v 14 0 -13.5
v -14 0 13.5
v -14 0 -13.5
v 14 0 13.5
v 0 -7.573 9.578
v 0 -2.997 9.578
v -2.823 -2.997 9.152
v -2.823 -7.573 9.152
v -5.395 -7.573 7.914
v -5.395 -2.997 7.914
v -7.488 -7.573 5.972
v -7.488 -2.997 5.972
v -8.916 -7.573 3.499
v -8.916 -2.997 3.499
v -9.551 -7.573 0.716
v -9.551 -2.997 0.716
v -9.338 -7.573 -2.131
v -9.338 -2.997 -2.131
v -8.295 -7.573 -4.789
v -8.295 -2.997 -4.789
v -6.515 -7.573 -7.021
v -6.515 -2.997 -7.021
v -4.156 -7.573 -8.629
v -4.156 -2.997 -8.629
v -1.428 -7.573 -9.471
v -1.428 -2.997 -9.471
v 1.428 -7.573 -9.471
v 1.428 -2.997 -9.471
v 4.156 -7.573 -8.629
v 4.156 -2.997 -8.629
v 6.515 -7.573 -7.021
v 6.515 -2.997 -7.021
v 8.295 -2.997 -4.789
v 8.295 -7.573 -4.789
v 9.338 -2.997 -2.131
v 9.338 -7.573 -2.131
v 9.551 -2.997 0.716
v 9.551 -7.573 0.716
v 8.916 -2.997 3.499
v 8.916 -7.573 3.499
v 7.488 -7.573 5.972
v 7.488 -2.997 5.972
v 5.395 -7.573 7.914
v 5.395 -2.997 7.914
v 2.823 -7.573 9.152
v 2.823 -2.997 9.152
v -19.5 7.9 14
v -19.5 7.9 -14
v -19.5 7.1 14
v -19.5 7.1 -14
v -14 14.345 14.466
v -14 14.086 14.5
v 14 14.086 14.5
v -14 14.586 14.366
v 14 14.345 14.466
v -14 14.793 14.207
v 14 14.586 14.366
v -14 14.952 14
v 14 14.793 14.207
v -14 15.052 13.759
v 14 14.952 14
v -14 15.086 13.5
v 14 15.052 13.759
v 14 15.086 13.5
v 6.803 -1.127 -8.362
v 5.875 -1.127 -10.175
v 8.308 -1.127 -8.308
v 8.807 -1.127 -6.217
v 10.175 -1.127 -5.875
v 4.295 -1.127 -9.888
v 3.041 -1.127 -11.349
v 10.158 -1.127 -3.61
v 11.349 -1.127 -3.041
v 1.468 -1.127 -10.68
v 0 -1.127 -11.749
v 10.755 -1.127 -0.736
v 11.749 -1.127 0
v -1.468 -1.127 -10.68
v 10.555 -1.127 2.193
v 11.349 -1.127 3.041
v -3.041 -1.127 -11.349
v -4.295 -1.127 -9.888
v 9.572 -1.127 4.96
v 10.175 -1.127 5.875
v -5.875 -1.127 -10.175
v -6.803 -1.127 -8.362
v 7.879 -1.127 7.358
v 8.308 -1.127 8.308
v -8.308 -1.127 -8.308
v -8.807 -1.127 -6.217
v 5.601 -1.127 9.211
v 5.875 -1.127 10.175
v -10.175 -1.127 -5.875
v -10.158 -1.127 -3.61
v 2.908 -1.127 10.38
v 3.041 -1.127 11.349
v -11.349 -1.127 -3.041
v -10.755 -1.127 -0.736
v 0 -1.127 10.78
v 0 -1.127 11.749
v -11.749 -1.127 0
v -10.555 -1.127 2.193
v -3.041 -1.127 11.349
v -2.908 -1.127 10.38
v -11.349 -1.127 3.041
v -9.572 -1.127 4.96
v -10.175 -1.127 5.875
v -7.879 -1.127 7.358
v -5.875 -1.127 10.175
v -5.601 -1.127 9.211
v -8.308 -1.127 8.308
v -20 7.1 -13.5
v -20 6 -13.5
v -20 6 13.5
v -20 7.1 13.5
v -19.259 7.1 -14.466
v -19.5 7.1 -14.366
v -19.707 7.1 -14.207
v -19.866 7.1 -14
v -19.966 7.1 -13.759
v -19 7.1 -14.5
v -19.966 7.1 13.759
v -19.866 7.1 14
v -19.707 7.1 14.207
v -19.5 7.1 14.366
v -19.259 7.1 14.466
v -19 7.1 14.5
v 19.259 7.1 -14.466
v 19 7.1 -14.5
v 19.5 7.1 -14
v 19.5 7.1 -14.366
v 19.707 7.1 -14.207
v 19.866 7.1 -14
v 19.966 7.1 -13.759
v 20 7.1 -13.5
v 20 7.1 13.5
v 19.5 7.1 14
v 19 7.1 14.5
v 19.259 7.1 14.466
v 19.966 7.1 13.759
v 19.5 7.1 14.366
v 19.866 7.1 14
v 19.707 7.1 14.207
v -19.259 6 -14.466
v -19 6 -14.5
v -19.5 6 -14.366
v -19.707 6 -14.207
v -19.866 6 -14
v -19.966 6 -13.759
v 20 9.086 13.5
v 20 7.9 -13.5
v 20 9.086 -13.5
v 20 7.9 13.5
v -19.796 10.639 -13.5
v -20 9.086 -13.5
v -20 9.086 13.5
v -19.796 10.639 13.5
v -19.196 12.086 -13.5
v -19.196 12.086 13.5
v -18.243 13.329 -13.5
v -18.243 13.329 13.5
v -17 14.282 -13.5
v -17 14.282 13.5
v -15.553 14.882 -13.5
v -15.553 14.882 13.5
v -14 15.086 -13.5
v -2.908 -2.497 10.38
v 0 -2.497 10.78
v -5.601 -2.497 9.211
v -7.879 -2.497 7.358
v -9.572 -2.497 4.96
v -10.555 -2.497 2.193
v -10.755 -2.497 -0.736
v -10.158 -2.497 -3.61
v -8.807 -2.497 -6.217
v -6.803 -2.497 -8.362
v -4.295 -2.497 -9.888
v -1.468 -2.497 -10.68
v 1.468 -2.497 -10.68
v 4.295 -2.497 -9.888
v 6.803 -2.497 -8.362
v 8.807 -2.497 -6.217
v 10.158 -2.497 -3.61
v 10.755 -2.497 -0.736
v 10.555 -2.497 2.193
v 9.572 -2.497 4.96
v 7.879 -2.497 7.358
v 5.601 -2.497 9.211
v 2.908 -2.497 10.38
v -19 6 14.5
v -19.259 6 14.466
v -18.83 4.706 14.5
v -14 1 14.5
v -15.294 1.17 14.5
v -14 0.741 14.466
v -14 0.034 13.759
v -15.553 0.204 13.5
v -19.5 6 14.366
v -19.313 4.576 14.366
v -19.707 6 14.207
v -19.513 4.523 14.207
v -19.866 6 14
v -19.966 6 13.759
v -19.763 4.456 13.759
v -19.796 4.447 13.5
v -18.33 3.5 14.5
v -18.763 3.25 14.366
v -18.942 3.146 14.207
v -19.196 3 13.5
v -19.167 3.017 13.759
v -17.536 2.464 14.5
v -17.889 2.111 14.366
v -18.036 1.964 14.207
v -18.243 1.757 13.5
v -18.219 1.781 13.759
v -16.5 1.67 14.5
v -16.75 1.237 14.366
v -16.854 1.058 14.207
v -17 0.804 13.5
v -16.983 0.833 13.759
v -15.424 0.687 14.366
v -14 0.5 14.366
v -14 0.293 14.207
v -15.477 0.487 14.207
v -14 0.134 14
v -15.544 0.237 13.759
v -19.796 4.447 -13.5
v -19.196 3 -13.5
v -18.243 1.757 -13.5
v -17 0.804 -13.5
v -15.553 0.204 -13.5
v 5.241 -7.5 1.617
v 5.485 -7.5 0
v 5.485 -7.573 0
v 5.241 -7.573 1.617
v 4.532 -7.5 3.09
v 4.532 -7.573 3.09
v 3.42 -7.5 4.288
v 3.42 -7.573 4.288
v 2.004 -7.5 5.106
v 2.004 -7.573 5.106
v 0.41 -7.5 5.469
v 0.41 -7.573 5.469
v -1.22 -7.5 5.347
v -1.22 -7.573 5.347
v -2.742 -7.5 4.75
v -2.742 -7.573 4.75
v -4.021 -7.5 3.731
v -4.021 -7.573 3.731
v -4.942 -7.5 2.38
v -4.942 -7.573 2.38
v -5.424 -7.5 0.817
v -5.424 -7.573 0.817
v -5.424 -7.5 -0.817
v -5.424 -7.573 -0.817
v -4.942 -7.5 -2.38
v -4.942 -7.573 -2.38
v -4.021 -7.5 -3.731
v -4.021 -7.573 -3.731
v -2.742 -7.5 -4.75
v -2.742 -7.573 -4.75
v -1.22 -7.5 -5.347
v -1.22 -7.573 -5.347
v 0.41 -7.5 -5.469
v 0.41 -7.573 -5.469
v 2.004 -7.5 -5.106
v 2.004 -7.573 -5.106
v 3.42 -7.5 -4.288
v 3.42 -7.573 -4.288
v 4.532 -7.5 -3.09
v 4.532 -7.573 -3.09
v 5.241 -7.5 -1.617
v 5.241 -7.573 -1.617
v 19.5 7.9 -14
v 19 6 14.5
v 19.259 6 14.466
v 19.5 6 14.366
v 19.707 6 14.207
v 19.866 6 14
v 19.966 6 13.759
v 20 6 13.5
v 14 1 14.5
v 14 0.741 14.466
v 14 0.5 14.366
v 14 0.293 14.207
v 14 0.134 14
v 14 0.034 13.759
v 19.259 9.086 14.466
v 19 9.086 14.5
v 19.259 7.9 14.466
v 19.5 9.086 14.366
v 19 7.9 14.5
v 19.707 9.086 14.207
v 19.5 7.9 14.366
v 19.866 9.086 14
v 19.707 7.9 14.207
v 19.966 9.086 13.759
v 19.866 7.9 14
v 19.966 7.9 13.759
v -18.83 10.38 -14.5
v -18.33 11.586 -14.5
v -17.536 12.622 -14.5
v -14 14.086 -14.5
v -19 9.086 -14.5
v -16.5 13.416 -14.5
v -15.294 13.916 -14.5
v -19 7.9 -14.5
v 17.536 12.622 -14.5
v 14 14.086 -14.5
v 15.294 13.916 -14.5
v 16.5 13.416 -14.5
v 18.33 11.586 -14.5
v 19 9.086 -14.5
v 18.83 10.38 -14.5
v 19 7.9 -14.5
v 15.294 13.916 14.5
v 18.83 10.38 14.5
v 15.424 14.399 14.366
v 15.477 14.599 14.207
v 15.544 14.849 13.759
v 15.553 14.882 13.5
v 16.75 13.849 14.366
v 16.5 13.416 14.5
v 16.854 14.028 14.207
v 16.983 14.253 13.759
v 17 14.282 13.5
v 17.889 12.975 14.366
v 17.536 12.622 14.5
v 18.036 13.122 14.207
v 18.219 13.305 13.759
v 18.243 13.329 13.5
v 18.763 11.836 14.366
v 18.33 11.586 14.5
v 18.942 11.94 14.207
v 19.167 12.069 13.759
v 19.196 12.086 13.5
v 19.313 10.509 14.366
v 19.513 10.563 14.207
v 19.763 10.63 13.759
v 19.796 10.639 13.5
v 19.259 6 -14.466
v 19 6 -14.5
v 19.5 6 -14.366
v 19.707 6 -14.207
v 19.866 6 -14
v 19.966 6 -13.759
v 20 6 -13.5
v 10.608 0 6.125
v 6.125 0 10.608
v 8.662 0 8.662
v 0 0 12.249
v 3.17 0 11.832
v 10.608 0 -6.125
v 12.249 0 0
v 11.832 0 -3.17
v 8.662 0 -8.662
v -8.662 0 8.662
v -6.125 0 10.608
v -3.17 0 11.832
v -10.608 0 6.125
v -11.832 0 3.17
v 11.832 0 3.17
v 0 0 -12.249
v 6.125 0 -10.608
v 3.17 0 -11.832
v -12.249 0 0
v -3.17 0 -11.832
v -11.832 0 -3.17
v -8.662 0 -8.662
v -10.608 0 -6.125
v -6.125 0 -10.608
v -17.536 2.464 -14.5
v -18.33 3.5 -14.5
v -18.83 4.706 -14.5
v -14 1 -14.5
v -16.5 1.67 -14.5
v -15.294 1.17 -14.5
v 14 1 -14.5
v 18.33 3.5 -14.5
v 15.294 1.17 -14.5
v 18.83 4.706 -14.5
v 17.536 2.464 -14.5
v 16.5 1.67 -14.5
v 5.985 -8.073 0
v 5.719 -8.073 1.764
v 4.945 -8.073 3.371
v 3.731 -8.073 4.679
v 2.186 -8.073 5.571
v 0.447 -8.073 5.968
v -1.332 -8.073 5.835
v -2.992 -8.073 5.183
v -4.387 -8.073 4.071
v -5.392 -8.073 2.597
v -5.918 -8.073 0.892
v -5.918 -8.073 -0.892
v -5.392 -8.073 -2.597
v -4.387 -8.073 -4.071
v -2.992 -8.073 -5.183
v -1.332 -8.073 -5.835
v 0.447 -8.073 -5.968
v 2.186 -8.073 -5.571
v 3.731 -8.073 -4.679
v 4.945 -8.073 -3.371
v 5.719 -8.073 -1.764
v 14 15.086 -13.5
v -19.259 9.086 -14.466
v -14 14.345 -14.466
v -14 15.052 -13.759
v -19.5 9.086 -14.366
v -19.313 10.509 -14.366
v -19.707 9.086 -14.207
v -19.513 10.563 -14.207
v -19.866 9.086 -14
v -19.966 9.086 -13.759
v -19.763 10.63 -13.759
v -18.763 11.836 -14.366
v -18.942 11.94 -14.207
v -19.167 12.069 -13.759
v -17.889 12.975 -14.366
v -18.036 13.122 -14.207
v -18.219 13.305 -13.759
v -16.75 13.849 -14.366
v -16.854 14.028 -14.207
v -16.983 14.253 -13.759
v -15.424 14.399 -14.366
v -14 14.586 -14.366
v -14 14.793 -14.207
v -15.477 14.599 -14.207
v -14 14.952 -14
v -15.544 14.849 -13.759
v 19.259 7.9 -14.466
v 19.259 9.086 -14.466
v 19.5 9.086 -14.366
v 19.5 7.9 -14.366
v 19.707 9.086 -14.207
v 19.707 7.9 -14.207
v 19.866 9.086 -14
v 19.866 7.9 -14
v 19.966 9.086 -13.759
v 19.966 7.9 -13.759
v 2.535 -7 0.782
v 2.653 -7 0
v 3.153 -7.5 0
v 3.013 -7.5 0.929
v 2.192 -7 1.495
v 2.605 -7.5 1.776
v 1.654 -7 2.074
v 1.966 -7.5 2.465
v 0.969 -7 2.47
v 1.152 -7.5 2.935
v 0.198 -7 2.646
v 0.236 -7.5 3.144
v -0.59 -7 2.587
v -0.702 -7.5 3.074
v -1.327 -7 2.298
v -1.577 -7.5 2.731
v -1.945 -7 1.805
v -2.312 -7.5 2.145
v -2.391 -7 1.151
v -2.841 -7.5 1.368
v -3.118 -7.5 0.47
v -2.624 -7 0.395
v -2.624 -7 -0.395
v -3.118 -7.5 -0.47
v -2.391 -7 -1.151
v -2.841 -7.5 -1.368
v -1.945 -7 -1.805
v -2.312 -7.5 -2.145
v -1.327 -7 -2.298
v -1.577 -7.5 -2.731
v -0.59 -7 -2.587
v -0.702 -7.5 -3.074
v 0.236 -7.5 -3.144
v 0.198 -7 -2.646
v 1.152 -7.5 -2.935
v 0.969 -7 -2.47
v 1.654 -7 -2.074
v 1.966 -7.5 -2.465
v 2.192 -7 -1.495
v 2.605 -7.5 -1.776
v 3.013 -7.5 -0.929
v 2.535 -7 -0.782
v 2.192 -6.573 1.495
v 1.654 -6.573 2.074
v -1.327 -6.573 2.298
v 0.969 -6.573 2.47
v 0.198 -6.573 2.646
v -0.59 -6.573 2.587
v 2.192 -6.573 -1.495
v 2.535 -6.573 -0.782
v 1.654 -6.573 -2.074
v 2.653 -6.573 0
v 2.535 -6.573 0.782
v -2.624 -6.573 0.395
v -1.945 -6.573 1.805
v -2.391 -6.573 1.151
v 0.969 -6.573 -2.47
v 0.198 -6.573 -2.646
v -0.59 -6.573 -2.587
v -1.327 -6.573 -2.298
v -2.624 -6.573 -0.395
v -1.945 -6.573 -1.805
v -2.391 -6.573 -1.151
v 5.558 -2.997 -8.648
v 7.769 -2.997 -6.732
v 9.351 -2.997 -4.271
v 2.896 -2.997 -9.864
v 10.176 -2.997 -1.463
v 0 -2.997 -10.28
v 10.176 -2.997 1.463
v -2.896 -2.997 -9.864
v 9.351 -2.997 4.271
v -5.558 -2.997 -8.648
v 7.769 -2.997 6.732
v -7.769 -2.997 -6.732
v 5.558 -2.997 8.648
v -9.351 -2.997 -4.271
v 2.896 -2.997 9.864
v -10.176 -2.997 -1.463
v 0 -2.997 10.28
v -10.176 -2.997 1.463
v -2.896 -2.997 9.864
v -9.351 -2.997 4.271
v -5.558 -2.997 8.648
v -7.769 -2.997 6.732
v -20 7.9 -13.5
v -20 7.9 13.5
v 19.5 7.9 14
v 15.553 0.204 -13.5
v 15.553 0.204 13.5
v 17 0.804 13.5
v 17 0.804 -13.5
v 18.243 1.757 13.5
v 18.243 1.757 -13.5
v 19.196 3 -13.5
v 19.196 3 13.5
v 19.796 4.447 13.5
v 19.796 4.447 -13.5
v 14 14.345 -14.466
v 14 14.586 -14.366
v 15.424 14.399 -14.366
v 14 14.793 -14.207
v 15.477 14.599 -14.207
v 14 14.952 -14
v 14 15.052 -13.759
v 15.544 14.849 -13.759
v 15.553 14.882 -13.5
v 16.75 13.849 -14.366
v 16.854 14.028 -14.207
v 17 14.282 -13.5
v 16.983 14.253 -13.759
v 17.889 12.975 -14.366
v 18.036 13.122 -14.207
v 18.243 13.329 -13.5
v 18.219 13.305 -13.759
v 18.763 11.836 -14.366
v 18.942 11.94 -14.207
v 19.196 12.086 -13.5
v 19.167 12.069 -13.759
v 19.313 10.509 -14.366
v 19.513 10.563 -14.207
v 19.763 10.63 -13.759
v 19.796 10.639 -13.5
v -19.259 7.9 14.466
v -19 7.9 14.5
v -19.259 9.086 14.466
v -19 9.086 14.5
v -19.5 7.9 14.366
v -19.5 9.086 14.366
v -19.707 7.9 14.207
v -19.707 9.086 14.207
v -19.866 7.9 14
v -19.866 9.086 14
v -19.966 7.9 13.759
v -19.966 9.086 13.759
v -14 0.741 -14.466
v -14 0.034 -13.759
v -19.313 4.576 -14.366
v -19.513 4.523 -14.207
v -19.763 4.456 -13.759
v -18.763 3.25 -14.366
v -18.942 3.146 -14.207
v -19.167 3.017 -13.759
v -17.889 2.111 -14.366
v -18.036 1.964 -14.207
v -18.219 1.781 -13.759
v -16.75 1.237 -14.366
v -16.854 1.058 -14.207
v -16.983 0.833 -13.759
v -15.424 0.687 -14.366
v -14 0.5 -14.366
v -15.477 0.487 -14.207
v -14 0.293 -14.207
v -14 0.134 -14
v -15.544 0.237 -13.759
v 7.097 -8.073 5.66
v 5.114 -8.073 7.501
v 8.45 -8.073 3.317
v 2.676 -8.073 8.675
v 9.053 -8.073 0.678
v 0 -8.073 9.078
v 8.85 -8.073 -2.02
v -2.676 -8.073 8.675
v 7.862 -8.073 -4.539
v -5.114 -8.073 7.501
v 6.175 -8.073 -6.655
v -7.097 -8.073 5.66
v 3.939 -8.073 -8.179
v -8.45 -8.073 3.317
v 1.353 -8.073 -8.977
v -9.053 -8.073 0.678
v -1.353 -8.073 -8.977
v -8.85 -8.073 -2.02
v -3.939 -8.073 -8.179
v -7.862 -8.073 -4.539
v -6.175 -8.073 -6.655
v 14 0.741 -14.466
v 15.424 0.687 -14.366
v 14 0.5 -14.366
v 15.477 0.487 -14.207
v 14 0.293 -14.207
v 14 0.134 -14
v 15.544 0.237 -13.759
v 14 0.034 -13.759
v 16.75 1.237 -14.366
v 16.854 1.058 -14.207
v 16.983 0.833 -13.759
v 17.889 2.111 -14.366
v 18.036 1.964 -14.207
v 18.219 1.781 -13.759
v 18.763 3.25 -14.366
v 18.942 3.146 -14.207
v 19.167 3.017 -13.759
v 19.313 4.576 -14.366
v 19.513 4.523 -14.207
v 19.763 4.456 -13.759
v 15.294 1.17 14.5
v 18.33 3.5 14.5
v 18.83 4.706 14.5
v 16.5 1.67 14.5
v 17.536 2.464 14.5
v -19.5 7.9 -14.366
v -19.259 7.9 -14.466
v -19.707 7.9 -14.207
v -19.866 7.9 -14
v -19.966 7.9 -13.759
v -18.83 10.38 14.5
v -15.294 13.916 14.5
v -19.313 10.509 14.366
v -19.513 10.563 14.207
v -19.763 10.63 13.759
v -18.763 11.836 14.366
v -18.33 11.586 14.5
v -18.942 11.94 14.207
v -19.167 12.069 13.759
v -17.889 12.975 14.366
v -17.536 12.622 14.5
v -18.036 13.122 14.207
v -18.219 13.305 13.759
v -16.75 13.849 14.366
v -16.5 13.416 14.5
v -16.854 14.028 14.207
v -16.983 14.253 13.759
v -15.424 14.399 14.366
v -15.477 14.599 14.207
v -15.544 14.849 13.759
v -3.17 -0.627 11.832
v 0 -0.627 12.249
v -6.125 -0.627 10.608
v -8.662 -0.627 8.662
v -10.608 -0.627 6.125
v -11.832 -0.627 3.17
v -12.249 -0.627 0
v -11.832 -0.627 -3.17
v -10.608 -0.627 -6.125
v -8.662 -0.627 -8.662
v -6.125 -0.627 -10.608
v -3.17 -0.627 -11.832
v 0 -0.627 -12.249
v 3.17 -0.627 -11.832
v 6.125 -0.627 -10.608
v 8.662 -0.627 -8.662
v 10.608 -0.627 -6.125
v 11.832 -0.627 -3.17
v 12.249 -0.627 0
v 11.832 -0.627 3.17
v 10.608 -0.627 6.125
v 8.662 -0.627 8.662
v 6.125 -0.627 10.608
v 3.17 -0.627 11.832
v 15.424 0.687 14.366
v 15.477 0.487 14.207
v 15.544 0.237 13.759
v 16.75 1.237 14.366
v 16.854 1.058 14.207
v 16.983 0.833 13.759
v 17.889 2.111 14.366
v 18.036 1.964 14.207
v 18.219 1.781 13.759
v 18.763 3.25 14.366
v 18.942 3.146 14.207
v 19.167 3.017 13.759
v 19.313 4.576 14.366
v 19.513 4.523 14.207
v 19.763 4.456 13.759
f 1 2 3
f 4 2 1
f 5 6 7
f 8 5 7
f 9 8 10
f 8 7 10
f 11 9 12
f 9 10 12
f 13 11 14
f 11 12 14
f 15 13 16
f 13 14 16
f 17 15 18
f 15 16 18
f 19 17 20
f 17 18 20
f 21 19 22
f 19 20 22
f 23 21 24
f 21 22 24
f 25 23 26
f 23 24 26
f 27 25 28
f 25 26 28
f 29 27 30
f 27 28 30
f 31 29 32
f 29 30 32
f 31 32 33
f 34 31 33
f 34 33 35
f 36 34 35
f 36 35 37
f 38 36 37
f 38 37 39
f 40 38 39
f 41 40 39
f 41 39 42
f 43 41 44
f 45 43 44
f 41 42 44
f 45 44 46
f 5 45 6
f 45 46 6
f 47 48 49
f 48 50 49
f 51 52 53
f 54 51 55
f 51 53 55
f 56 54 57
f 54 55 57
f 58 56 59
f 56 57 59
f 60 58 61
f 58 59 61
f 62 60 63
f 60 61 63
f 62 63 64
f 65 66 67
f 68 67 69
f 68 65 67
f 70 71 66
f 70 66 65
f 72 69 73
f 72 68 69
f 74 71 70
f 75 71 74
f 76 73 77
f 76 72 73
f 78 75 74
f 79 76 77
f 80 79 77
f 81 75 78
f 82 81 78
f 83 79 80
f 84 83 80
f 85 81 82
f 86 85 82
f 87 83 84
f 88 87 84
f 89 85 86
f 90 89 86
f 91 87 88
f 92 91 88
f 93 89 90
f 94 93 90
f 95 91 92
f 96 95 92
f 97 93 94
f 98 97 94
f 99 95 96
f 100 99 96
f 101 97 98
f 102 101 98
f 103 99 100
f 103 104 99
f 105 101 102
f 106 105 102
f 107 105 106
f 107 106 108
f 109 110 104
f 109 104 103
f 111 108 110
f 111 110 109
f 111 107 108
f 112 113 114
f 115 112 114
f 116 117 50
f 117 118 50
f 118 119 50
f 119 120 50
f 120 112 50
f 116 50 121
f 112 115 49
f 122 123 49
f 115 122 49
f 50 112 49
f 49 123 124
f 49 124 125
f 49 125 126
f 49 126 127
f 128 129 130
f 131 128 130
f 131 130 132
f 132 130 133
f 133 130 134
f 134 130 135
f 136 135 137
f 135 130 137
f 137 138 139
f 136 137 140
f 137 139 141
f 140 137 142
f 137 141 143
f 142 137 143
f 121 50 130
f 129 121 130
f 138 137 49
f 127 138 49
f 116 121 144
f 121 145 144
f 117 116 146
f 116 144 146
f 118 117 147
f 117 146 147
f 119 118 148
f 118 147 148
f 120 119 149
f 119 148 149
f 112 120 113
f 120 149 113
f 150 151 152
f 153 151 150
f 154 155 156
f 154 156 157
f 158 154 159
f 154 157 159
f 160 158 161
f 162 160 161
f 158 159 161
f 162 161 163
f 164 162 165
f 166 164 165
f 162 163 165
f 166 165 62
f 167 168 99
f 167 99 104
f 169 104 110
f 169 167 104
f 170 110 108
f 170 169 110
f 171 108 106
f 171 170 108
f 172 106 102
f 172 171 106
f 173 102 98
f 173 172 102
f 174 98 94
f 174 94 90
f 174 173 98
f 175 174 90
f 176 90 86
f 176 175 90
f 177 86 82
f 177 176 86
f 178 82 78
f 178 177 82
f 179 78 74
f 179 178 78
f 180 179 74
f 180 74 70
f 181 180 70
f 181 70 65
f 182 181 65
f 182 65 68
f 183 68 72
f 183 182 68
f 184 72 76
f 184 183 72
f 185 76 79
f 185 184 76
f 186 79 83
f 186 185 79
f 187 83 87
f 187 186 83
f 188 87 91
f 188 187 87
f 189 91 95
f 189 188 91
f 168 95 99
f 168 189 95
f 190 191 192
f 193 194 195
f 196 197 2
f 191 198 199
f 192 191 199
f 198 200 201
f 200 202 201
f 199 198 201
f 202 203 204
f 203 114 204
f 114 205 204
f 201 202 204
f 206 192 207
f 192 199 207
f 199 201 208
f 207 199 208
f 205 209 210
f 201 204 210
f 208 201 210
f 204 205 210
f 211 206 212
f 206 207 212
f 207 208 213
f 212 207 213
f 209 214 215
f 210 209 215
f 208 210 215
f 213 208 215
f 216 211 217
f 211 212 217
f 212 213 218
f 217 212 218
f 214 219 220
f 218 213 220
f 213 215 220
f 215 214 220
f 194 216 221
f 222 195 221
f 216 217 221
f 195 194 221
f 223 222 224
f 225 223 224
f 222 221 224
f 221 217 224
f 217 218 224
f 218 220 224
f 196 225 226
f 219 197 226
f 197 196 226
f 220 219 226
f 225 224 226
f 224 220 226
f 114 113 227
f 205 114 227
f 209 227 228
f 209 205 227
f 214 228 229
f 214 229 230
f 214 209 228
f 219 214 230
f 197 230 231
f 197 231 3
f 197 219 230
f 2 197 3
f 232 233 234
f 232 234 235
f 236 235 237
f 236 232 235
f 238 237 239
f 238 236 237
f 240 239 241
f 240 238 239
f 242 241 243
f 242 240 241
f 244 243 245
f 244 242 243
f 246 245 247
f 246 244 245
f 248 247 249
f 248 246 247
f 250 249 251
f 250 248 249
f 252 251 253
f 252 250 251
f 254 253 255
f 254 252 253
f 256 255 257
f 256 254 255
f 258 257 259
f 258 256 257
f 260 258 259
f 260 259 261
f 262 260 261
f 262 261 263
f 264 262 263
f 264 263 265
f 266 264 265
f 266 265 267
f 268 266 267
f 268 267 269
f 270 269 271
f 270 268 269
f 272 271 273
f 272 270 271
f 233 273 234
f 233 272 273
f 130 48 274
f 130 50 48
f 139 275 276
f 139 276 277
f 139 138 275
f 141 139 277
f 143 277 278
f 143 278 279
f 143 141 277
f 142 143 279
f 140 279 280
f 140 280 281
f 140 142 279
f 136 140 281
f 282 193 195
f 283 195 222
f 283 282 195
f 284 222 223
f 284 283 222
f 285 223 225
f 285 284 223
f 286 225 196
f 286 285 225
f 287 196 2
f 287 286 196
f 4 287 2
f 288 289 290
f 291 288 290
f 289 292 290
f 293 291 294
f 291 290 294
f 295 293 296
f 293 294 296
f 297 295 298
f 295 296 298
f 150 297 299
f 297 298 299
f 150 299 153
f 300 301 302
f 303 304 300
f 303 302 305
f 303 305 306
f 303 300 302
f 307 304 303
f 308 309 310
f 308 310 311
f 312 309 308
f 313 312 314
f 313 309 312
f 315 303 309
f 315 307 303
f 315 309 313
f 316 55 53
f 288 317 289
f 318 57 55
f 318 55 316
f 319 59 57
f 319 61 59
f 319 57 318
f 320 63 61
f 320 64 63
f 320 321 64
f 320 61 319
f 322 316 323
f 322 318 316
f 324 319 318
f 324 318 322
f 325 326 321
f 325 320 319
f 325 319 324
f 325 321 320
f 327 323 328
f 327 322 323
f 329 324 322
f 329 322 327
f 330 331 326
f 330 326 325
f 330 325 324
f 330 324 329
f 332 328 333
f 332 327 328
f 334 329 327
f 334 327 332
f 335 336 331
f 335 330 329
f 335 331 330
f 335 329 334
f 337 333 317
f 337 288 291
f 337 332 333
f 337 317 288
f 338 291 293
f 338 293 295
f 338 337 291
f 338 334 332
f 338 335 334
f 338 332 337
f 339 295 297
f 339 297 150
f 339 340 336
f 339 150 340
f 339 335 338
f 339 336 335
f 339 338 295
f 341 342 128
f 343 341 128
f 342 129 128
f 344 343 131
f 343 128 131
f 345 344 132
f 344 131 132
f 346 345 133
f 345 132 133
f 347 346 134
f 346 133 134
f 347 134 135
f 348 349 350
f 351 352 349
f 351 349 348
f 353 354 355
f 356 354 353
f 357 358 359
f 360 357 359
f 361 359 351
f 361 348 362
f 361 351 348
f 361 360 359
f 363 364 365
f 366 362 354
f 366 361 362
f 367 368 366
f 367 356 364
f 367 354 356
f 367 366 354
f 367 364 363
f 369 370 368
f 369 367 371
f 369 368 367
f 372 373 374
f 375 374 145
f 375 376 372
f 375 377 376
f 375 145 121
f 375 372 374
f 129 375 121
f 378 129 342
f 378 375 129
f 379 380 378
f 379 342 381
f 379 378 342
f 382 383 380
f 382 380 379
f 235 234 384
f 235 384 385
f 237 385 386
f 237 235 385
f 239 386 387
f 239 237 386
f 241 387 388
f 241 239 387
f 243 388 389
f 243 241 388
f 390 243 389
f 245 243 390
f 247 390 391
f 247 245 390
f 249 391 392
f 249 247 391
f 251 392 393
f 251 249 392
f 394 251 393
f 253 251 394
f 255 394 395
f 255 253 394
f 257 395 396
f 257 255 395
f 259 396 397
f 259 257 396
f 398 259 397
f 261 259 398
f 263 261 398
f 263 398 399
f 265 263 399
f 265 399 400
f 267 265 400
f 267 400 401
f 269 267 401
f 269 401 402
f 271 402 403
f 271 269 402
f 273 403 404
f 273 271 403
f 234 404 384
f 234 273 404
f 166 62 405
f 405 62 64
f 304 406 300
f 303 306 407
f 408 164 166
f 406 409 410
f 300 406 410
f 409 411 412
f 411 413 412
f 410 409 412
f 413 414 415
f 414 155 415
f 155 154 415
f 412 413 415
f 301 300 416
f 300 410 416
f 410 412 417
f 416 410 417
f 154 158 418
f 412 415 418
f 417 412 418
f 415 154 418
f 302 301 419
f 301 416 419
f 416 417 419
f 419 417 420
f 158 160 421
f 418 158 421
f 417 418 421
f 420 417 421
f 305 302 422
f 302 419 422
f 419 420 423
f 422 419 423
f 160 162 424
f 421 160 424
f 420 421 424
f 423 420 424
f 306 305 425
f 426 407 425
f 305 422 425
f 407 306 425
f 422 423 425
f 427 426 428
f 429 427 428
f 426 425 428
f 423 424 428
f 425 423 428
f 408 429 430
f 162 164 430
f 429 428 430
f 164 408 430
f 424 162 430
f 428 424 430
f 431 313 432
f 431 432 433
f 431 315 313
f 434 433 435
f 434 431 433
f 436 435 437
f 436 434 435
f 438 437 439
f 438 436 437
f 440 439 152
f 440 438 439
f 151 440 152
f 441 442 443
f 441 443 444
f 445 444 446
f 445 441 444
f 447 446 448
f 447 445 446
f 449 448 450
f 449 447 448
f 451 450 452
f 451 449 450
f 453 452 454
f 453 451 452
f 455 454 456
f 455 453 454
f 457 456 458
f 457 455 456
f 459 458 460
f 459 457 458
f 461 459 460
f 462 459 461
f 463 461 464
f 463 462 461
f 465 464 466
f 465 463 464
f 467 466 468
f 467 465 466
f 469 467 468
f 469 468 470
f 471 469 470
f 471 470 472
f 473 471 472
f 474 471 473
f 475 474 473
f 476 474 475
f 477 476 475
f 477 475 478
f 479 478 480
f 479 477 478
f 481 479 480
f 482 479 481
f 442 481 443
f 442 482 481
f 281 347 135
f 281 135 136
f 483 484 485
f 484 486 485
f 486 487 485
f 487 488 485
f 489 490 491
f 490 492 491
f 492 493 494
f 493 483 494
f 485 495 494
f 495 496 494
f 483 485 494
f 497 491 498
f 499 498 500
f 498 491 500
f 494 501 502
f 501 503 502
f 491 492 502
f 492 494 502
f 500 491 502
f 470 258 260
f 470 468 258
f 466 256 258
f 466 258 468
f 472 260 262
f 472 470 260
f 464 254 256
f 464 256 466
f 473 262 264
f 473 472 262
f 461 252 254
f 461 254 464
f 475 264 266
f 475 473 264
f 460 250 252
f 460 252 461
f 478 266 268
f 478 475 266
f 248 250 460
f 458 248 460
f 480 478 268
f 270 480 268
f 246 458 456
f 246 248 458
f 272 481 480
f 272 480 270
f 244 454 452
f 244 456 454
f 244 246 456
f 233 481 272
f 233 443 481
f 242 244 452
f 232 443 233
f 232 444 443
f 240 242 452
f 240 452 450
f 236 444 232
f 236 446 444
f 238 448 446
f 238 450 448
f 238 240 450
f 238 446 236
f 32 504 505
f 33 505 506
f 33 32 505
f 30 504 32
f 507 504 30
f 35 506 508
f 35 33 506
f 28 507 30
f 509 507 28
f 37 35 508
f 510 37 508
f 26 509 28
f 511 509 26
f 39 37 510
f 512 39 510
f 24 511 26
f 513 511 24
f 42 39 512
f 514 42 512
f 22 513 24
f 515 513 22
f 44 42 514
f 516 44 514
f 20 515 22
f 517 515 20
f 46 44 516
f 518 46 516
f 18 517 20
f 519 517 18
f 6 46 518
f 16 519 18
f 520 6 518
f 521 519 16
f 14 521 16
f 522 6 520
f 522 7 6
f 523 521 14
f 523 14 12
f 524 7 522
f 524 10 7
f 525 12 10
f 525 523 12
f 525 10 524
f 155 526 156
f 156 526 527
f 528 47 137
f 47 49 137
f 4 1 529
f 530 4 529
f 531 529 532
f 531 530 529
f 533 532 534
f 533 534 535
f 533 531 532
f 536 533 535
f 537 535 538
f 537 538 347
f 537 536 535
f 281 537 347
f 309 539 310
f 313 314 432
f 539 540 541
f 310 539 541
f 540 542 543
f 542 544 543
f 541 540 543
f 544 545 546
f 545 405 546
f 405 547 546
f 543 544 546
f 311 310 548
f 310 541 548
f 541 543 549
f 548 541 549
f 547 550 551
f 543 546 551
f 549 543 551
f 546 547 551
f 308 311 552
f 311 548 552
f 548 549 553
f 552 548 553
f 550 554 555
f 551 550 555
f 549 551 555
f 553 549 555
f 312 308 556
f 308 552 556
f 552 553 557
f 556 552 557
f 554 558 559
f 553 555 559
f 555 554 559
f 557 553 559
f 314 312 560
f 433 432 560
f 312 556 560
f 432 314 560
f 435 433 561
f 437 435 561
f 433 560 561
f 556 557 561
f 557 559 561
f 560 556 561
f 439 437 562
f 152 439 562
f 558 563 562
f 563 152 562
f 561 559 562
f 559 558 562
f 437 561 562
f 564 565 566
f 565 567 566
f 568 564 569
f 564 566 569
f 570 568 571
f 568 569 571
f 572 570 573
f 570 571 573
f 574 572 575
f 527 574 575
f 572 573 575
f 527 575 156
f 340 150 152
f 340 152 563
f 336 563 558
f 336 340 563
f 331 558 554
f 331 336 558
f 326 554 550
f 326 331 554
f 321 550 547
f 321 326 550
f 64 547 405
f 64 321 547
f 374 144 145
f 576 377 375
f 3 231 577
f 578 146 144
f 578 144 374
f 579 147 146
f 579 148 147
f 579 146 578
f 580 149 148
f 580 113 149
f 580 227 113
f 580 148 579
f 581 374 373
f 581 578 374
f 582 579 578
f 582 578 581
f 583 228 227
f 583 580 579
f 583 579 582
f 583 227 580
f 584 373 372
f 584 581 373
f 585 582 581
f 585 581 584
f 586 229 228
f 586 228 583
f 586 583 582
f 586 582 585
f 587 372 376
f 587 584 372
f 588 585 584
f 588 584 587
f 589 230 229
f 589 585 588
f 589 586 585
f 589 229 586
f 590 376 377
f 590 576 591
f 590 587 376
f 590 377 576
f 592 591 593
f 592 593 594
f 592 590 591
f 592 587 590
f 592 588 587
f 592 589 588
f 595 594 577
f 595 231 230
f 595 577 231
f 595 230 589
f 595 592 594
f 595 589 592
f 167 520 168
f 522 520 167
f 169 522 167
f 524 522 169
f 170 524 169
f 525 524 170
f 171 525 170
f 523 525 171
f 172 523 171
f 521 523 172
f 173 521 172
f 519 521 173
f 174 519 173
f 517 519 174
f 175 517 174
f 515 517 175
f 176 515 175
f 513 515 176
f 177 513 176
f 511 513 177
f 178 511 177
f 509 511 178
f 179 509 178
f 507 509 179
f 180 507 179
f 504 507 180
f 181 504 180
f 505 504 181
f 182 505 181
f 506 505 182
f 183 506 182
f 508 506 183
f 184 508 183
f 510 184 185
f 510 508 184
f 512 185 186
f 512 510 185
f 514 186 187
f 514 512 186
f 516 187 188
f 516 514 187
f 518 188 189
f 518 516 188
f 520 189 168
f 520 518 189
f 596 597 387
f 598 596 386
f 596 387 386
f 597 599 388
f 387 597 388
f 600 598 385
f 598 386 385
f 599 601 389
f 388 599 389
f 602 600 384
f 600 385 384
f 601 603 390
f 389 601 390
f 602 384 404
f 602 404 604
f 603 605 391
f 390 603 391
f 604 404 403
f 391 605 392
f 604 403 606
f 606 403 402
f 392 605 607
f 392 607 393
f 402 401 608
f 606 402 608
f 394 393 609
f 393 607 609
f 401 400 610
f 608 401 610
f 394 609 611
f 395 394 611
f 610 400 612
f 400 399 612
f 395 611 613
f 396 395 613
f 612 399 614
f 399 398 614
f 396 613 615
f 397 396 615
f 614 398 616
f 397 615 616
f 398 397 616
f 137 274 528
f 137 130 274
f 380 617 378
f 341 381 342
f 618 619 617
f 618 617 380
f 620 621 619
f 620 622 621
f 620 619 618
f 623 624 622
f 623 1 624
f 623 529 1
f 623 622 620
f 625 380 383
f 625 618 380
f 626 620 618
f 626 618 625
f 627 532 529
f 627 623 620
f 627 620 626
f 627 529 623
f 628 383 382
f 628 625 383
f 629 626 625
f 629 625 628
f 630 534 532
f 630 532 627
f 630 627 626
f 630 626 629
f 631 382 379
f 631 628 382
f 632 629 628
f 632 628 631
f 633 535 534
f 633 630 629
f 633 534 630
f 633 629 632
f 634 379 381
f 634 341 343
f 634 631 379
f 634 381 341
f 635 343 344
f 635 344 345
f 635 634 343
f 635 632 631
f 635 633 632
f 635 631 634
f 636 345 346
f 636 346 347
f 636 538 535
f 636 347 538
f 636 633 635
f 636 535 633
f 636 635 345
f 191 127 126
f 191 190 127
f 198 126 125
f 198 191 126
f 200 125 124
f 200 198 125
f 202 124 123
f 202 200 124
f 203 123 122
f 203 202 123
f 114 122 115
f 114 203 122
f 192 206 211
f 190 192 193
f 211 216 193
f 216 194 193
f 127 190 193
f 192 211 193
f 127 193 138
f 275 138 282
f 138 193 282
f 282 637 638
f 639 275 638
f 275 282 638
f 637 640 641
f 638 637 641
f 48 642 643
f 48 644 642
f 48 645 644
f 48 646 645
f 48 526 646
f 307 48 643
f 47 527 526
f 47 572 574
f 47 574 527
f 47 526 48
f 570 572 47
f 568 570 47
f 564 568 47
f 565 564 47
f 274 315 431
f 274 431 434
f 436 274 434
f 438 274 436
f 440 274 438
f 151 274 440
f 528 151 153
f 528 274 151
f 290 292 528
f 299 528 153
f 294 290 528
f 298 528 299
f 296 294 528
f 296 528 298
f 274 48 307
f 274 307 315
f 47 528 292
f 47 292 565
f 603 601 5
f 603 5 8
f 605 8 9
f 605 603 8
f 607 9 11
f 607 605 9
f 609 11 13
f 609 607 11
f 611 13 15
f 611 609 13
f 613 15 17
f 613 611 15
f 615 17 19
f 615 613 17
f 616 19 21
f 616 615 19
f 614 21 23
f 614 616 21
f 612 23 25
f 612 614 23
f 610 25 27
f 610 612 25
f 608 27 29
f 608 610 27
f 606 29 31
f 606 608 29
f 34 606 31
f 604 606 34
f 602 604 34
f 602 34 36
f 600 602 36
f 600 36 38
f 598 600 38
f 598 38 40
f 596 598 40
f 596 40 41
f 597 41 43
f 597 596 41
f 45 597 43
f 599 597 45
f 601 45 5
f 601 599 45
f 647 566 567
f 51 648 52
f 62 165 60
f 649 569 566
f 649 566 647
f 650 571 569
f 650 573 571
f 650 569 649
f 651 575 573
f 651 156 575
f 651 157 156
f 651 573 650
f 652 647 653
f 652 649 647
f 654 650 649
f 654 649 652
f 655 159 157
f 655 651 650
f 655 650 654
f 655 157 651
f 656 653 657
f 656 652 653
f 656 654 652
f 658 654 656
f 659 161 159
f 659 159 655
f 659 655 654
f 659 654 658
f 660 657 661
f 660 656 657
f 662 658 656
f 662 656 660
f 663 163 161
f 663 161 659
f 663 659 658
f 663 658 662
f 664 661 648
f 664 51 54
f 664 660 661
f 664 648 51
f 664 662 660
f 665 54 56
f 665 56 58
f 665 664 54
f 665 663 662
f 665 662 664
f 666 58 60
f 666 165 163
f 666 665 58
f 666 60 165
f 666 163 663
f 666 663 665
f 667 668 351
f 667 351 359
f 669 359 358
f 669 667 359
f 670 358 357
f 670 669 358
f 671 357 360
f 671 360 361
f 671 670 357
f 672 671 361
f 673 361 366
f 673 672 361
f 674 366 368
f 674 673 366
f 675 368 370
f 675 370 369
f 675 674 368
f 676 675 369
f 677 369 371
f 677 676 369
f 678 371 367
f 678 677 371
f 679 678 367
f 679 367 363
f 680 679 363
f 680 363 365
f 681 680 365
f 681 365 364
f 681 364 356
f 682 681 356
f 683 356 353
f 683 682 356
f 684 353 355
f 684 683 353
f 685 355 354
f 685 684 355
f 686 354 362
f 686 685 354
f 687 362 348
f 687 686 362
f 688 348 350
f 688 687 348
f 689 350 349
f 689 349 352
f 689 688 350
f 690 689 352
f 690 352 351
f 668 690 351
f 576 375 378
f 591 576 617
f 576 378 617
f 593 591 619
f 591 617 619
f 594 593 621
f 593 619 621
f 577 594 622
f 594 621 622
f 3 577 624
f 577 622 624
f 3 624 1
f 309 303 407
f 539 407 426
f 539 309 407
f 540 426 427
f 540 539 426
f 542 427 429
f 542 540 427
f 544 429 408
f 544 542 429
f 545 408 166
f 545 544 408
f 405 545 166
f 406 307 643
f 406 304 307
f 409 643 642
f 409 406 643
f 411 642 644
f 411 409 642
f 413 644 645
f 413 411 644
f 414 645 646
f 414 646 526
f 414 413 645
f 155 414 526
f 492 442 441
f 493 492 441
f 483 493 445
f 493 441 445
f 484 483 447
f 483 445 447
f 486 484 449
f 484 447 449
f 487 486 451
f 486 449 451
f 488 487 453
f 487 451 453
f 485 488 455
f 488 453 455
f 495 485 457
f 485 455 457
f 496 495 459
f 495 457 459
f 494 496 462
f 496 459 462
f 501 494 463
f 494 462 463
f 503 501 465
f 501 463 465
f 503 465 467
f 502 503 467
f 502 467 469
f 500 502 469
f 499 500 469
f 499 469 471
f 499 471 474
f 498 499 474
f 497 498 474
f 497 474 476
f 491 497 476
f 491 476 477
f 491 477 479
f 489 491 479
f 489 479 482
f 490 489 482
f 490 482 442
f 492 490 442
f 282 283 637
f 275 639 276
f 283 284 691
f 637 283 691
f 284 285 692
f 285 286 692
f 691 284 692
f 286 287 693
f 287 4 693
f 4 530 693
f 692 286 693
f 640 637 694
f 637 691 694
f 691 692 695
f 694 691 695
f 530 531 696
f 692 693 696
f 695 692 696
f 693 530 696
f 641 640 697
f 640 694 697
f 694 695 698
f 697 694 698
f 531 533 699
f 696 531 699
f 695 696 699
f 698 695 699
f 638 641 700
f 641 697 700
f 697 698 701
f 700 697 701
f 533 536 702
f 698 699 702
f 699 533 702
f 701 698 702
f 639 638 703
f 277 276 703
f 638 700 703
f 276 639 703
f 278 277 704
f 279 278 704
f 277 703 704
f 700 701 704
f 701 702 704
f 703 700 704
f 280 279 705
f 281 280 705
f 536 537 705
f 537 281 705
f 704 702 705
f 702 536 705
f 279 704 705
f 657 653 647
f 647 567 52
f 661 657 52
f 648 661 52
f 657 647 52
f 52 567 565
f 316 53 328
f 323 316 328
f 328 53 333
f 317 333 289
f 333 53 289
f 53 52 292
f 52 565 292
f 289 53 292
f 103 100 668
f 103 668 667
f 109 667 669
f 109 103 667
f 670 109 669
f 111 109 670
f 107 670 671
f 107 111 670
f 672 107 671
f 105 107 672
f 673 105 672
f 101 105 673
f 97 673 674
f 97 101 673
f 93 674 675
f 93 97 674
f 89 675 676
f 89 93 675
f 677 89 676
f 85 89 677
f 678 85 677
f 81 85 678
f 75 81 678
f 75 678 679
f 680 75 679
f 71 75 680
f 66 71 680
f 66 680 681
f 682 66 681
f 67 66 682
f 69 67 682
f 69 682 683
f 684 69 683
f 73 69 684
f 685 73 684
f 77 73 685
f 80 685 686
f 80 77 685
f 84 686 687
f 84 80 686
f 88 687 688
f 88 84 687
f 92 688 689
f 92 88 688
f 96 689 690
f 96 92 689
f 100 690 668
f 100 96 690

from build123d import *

# Parameters (mm, degrees)
F0_W     = 40
F0_H     = 29
F0_R     = 12.2201503023
F0_R_2   = 10.8303270275
F0_R_3   = 9.5580037693
F0_R_4   = 5.4847630388
F0_R_5   = 2.6532695581
F2_DEPTH = 15.08599
F1_W     = 5.0759501755
F1_H     = 9.5779409166
F4_START = 7.5
F4_DEPTH = 0.5727357417
F5_DEPTH = 1.5
F7_W     = 40
F7_H     = 29
F8_DEPTH = 0.4
F9_T     = -0.5
F11_R    = 6
F12_R    = 1
F13_SIZE = 0.5


with BuildPart() as f2:
    # F0 (on Front) → F2 (new body)
    with BuildSketch(Plane.XZ):
        Rectangle(F0_W, F0_H)
        Circle(F0_R, mode=Mode.SUBTRACT)
        Circle(F0_R)
        Circle(F0_R_2, mode=Mode.SUBTRACT)
        Circle(F0_R_2)
        Circle(F0_R_3, mode=Mode.SUBTRACT)
        Circle(F0_R_3)
        Circle(F0_R_4, mode=Mode.SUBTRACT)
        Circle(F0_R_4)
        Circle(F0_R_5, mode=Mode.SUBTRACT)
        Circle(F0_R_5)
    extrude(amount=-F2_DEPTH)


with BuildPart() as f3:
    # F1 (on Right) → F3 (revolve)
    with BuildSketch(Plane.YZ):
        Polygon((0, 0), (0, 12.249491876), (-1.1267004302, 12.249491876), (-1.1267004302, 10.7801386621), (-1.1267004302, 0), align=None)
        Polygon((-2.9967855662, 0), (-1.1267004302, 0), (-1.1267004302, 10.7801386621), (-2.9967855662, 10.7801386621), (-2.9967855662, 9.5779409166), align=None)
        with Locations((-5.534760654, 4.7889704583)):
            Rectangle(F1_W, F1_H)
    revolve(axis=Axis((0, -4.0363678709, 0), (0, -1, 0)))

    # F0 (on Front) → F4 (cut)
    with BuildSketch(Plane.XZ.offset(F4_START)):
        Circle(F0_R_4)
        Circle(F0_R_5, mode=Mode.SUBTRACT)
    extrude(amount=F4_DEPTH, mode=Mode.SUBTRACT)

    # F5 (cut): a face of the model
    f5_faces = [f3.faces().sort_by_distance(p)[0] for p in [
        (0, -8.0727357417, 0),
    ]]
    extrude(f5_faces, amount=-F5_DEPTH, mode=Mode.SUBTRACT)

    # F13
    f13_edges = [f3.edges().sort_by_distance(p)[0] for p in [
        (0, -8.072736, -9.577941),
        (0, -2.996786, -10.780139),
        (0, -1.1267, -12.249492),
        (-5.484763, -8.072736, 0),
        (-2.65327, -7.5, 0),
    ]]
    chamfer(f13_edges, length=F13_SIZE)


with BuildPart() as f8:
    # F7 (on offset) → F8 (new body, symmetric)
    with BuildSketch(Plane.XZ.offset(-7.5)):
        Rectangle(F7_W, F7_H)
    extrude(amount=F8_DEPTH, both=True)

    # F9
    f9_openings = [f8.faces().sort_by_distance(p)[0] for p in [
        (0, 7.1, 0),
        (0, 7.9, 0),
    ]]
    offset(amount=F9_T, openings=f9_openings)


with BuildPart() as f2_1:
    add(f2.part)

    # F10: cut F8
    add(f8.part, mode=Mode.SUBTRACT)

    # F11
    f11_edges = [f2_1.edges().sort_by_distance(p)[0] for p in [
        (20, 0, 0),
        (20, 15.08599, 0),
        (-20, 0, 0),
        (-20, 15.08599, 0),
    ]]
    fillet(f11_edges, radius=F11_R)

    # F12
    f12_edges = [f2_1.edges().sort_by_distance(p)[0] for p in [
        (0, 0, 14.5),
        (0, 15.08599, 14.5),
        (0, 15.08599, -14.5),
        (0, 0, -14.5),
    ]]
    fillet(f12_edges, radius=F12_R)


solid = Compound([f3.part, f2_1.part])
